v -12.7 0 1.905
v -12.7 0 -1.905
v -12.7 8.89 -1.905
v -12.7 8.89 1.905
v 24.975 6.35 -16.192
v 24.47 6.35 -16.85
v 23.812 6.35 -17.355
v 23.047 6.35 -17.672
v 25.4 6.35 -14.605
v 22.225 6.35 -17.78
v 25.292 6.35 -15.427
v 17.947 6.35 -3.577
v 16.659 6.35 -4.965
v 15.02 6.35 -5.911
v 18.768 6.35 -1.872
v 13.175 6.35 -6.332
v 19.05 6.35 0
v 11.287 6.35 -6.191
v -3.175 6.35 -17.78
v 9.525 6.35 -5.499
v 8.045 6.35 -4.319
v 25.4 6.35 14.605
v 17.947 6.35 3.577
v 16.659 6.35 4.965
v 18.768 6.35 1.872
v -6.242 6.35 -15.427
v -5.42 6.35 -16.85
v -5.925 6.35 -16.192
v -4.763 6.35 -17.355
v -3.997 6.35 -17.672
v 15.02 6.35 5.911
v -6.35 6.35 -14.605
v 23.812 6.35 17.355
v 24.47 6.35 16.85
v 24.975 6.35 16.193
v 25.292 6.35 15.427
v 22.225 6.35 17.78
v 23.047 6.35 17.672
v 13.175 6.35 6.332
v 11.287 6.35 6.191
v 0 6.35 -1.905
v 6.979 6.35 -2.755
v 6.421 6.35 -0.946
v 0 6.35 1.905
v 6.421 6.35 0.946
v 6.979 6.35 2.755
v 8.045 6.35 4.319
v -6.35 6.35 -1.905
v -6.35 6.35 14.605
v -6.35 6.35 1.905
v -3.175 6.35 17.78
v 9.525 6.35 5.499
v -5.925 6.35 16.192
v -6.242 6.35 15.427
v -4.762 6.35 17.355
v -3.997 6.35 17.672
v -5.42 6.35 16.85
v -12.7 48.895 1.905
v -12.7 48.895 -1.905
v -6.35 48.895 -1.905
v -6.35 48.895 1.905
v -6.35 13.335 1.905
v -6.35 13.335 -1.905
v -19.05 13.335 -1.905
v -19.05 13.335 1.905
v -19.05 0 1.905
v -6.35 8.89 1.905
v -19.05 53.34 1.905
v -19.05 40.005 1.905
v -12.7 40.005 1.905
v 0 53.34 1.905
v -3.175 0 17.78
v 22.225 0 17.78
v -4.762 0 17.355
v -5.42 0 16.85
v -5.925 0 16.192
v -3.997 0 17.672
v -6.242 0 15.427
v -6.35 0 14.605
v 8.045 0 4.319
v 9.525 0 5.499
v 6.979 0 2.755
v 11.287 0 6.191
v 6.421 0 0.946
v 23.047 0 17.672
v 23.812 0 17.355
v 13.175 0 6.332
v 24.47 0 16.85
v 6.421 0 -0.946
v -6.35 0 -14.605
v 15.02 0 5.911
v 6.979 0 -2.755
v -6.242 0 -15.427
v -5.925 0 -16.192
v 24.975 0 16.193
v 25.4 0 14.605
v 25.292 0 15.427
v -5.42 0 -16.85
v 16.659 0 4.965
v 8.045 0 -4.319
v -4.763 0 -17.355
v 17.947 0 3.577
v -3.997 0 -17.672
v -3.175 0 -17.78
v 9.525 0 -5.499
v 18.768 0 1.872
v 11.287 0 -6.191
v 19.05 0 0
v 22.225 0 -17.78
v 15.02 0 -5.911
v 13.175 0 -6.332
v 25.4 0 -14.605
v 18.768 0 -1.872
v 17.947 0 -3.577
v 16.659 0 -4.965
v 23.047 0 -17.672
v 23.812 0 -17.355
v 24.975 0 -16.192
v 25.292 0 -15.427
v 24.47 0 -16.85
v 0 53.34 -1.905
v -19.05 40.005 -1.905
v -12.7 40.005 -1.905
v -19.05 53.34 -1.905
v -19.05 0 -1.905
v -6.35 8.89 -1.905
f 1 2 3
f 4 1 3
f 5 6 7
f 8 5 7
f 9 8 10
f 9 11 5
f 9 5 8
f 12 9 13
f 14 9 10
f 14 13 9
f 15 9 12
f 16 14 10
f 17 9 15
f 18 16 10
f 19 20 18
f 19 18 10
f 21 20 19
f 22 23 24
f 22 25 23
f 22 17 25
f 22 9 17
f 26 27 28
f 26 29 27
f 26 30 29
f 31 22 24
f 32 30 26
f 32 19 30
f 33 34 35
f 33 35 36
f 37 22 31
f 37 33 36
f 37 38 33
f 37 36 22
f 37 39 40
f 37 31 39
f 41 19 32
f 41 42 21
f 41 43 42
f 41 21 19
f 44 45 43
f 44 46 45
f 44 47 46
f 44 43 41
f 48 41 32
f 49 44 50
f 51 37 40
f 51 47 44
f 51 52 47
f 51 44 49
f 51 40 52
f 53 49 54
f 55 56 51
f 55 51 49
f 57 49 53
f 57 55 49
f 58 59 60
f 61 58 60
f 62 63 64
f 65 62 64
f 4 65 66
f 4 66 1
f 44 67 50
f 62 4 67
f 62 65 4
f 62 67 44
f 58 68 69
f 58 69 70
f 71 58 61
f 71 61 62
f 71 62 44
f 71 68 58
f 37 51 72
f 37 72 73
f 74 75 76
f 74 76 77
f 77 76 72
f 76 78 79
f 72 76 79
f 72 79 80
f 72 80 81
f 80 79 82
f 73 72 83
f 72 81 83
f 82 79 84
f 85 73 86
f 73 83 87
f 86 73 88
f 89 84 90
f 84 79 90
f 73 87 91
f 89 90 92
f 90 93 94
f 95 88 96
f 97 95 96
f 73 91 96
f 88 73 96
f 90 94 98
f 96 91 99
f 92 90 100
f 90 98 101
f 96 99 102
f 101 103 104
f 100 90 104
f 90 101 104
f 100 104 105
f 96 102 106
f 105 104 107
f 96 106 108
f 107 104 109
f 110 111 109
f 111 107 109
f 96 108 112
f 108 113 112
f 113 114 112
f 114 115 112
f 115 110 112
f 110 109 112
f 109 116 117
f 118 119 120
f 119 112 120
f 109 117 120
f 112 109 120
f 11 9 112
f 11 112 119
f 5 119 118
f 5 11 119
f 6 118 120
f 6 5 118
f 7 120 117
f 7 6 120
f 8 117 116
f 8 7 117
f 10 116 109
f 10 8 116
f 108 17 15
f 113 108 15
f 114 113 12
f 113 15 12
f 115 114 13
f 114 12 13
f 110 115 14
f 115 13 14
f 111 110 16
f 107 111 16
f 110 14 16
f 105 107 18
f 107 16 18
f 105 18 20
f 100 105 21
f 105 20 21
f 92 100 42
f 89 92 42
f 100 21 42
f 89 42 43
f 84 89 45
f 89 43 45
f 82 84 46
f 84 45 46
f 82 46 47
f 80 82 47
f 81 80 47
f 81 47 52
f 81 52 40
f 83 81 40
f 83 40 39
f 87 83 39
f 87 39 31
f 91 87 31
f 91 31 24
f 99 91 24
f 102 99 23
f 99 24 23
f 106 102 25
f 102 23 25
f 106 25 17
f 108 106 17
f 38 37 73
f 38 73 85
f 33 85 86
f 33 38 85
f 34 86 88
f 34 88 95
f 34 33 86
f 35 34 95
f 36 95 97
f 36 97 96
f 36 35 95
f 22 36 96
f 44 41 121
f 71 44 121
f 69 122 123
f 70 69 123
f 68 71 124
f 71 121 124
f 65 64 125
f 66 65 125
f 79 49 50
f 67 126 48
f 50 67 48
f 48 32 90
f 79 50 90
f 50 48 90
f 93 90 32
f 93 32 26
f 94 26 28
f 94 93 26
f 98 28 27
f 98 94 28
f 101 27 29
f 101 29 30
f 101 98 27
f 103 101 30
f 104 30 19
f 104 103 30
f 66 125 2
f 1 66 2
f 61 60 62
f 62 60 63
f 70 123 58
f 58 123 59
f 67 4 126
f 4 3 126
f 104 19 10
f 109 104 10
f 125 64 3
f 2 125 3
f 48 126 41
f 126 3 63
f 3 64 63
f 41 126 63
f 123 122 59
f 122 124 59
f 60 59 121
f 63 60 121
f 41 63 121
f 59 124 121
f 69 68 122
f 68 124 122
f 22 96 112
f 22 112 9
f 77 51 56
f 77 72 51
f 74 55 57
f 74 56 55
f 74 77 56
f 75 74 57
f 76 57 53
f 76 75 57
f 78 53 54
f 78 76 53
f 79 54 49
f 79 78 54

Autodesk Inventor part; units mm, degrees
ref_plane "YZ Plane" through (0, 0, 0) normal (1, 0, 0) x (0, 1, 0)
ref_plane "XZ Plane" through (0, 0, 0) normal (0, 1, 0) x (-1, 0, 0)
ref_plane "XY Plane" through (0, 0, 0) normal (0, 0, 1) x (1, 0, 0)
sketch "Sketch1" plane through (0, 0, 0) normal (0, 0, 1) x (1, 0, 0)
  line L0 (0, 6.35) -> (0, 53.34)
  line L1 (0, 53.34) -> (-19.05, 53.34)
  line L2 (-19.05, 53.34) -> (-19.05, 55.245)
  line L3 (-12.7, 48.895) -> (-6.35, 48.895)
  line L4 (-6.35, 48.895) -> (-6.35, 13.335)
  line L5 (-6.35, 13.335) -> (-19.05, 13.335)
  line L6 (-19.05, 13.335) -> (-19.05, 12.7)
  line L7 (-12.7, 8.89) -> (-6.35, 8.89)
  line L8 (-6.35, 8.89) -> (-6.35, 0)
  line L9 (-6.35, 0) -> (0, 0)
  line L10 (-19.05, 55.245) -> (-19.05, 40.005)
  line L11 (-19.05, 40.005) -> (-12.7, 40.005)
  line L12 (-12.7, 40.005) -> (-12.7, 48.895)
  line L13 (-19.05, 12.7) -> (-19.05, 0)
  line L14 (-19.05, 0) -> (-12.7, 0)
  line L15 (-12.7, 0) -> (-12.7, 8.89)
  line L16 (0, 0) -> (0, 6.35)
  point P0 (-19.05, 53.34)
  point P1 (-19.05, 11.43)
  dimension "d1" = 35.56
  dimension "d2" = 4.445
  dimension "d3" = 4.445
  dimension "d4" = 6.35
  dimension "d6" = 6.35
  dimension "d7" = 6.35
  dimension "d13" = 13.335
  dimension "d14" = 13.335
extrude "Extrusion1" add sketch "Sketch1" along normal mid plane 3.81
sketch "Sketch4" plane through (0, 0, 0) normal (0, 0, 1) x (1, 0, 0)
  line L0 (0, 0) -> (-6.35, 0) projected
  line L1 (-6.35, 0) -> (25.4, 0)
  line L2 (25.4, 0) -> (25.4, 6.35)
  line L3 (25.4, 6.35) -> (-6.35, 6.35)
  line L4 (-6.35, 6.35) -> (-6.35, 0)
  dimension "d23" = 31.75
  dimension "d24" = 6.35
extrude "Extrusion4" add sketch "Sketch4" against normal mid plane 35.56
sketch "Sketch5" plane through (-6.35, 6.35, 17.78) normal (0, 1, 0) x (1, 0, 0)
  line L0 (31.75, 35.56) -> (0, 35.56) construction
  line L1 (6.35, 35.56) -> (6.35, 0) construction
  line L2 (31.75, 0) -> (0, 0) construction
  line L3 (31.75, 35.56) -> (31.75, 0) construction
  line L4 (6.35, 35.56) -> (31.75, 0) construction
  line L5 (31.75, 0) -> (6.35, 0) construction
  line L6 (31.75, 35.56) -> (6.35, 0) construction
  circle A0 centre (19.05, 17.78) radius 6.35
  point P0 (6.35, 17.78)
  dimension "d27" = 12.7
extrude "Extrusion5" cut sketch "Sketch5" against normal through all
fillet "Fillet2" radius 3.175 4 edges at (-6.35, 3.175, 17.78) (25.4, 3.175, 17.78) (25.4, 3.175, -17.78) (-6.35, 3.175, -17.78)
equation "\"d11\" = width"
equation "\"width\" = 3.81"
properties part number "round_0_5_inchHoleV01"
